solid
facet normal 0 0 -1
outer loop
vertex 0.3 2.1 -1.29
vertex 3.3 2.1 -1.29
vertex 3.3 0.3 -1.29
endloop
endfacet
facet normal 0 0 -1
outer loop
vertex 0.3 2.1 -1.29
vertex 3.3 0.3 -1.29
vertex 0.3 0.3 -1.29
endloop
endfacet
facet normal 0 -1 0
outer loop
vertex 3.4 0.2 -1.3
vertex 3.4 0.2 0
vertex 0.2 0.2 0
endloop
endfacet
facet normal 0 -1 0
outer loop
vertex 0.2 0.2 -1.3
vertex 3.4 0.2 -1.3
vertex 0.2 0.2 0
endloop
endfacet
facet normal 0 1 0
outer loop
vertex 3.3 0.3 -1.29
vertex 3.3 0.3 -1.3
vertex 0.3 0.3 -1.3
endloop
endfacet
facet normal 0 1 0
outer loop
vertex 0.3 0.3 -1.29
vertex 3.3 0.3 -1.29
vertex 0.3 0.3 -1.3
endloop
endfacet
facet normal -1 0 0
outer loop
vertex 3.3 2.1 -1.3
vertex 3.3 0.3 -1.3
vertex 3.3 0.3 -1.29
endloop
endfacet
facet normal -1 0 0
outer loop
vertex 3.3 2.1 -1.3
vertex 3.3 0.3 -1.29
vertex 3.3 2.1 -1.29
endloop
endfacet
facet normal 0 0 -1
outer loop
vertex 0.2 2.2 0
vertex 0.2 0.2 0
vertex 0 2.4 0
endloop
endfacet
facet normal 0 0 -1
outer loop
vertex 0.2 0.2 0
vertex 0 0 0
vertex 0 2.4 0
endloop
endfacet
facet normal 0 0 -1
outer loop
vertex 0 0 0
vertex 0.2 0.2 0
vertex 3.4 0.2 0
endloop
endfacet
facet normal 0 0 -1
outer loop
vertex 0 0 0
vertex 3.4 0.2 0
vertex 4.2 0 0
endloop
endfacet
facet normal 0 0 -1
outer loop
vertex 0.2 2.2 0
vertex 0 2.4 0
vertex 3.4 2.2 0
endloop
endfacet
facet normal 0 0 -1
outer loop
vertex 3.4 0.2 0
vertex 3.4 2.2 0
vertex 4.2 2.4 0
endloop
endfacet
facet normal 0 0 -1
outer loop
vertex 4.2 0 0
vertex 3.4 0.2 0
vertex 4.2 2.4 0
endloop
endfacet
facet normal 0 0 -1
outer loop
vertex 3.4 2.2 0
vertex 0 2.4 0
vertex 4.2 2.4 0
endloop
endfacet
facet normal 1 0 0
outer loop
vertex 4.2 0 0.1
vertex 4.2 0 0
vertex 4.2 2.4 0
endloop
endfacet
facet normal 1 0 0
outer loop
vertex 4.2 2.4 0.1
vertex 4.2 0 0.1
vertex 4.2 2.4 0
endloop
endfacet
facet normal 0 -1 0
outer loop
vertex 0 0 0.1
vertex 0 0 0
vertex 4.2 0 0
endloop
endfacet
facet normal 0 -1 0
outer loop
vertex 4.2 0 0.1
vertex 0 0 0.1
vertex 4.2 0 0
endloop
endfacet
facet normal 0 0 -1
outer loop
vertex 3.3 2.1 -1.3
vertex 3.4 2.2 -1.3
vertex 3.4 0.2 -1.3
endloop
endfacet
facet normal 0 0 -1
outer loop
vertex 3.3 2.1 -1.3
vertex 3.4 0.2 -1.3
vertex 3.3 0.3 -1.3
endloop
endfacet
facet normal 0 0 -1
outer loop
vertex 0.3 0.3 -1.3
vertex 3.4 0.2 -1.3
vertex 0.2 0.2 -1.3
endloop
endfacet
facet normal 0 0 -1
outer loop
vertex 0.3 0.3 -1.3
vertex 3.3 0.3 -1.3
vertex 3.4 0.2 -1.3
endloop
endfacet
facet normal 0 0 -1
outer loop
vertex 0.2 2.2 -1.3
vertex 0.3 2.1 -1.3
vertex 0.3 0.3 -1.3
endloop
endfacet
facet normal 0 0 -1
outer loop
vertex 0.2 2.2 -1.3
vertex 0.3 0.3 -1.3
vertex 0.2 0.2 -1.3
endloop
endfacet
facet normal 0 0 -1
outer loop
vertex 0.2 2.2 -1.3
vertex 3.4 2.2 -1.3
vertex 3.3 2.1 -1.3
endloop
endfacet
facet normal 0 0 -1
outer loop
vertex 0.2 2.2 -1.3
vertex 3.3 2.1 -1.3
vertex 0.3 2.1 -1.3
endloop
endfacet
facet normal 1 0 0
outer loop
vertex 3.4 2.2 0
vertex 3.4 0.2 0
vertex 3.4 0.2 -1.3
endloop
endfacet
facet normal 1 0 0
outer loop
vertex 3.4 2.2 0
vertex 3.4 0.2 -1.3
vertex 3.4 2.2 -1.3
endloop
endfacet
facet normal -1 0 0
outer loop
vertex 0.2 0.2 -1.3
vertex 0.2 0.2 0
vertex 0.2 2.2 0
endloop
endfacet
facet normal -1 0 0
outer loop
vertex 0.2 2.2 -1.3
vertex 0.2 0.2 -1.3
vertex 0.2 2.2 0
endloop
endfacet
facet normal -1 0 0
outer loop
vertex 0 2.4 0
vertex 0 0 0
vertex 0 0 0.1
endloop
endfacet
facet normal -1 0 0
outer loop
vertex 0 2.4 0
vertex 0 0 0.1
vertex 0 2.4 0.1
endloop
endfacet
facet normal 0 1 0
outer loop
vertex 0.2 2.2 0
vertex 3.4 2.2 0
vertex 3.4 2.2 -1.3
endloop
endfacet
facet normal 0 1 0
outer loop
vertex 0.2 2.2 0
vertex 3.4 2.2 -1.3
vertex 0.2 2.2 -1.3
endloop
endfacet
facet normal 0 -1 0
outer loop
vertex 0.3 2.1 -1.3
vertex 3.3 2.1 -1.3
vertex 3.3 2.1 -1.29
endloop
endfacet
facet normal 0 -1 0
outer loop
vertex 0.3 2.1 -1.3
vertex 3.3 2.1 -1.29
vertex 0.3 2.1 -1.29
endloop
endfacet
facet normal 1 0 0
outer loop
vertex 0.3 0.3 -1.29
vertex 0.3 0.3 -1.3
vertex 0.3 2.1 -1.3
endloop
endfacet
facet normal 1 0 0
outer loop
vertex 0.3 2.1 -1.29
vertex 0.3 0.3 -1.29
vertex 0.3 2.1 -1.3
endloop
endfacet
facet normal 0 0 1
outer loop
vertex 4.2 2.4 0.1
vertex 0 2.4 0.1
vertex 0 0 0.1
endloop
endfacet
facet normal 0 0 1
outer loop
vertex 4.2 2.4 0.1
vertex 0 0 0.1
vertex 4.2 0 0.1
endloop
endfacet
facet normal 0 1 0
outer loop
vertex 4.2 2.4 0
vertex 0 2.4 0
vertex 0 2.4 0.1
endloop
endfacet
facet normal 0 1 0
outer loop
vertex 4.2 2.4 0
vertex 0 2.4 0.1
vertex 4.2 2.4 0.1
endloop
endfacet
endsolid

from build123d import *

# Parameters (mm, degrees)
ESQUISSE2_W             = 4.2
ESQUISSE2_H             = 2.4
BOSS_EXTRU_1_DEPTH      = 0.1
ESQUISSE3_W             = 3.2
ESQUISSE3_H             = 2
BOSS_EXTRU_2_DEPTH      = 1.3
ESQUISSE4_W             = 3
ESQUISSE4_H             = 1.8
ENL_V_MAT_EXTRU_1_DEPTH = 0.01


with BuildPart() as part:
    # Esquisse2 → Boss.-Extru.1 (new body)
    with BuildSketch(Plane.XY):
        with Locations((2.1, 1.2)):
            Rectangle(ESQUISSE2_W, ESQUISSE2_H)
    extrude(amount=BOSS_EXTRU_1_DEPTH)

    # Esquisse3 → Boss.-Extru.2 (add)
    with BuildSketch(Plane(origin=(0, 0, 0), x_dir=(-1, 0, 0), z_dir=(0, 0, -1))):
        with Locations((-1.8, 1.2)):
            Rectangle(ESQUISSE3_W, ESQUISSE3_H)
    extrude(amount=BOSS_EXTRU_2_DEPTH)

    # Esquisse4 → Enlèv. mat.-Extru.1 (cut)
    with BuildSketch(Plane(origin=(0, 0, -1.3), x_dir=(-1, 0, 0), z_dir=(0, 0, -1))):
        with Locations((-1.8, 1.2)):
            Rectangle(ESQUISSE4_W, ESQUISSE4_H)
    extrude(amount=-ENL_V_MAT_EXTRU_1_DEPTH, mode=Mode.SUBTRACT)


solid = part.part
